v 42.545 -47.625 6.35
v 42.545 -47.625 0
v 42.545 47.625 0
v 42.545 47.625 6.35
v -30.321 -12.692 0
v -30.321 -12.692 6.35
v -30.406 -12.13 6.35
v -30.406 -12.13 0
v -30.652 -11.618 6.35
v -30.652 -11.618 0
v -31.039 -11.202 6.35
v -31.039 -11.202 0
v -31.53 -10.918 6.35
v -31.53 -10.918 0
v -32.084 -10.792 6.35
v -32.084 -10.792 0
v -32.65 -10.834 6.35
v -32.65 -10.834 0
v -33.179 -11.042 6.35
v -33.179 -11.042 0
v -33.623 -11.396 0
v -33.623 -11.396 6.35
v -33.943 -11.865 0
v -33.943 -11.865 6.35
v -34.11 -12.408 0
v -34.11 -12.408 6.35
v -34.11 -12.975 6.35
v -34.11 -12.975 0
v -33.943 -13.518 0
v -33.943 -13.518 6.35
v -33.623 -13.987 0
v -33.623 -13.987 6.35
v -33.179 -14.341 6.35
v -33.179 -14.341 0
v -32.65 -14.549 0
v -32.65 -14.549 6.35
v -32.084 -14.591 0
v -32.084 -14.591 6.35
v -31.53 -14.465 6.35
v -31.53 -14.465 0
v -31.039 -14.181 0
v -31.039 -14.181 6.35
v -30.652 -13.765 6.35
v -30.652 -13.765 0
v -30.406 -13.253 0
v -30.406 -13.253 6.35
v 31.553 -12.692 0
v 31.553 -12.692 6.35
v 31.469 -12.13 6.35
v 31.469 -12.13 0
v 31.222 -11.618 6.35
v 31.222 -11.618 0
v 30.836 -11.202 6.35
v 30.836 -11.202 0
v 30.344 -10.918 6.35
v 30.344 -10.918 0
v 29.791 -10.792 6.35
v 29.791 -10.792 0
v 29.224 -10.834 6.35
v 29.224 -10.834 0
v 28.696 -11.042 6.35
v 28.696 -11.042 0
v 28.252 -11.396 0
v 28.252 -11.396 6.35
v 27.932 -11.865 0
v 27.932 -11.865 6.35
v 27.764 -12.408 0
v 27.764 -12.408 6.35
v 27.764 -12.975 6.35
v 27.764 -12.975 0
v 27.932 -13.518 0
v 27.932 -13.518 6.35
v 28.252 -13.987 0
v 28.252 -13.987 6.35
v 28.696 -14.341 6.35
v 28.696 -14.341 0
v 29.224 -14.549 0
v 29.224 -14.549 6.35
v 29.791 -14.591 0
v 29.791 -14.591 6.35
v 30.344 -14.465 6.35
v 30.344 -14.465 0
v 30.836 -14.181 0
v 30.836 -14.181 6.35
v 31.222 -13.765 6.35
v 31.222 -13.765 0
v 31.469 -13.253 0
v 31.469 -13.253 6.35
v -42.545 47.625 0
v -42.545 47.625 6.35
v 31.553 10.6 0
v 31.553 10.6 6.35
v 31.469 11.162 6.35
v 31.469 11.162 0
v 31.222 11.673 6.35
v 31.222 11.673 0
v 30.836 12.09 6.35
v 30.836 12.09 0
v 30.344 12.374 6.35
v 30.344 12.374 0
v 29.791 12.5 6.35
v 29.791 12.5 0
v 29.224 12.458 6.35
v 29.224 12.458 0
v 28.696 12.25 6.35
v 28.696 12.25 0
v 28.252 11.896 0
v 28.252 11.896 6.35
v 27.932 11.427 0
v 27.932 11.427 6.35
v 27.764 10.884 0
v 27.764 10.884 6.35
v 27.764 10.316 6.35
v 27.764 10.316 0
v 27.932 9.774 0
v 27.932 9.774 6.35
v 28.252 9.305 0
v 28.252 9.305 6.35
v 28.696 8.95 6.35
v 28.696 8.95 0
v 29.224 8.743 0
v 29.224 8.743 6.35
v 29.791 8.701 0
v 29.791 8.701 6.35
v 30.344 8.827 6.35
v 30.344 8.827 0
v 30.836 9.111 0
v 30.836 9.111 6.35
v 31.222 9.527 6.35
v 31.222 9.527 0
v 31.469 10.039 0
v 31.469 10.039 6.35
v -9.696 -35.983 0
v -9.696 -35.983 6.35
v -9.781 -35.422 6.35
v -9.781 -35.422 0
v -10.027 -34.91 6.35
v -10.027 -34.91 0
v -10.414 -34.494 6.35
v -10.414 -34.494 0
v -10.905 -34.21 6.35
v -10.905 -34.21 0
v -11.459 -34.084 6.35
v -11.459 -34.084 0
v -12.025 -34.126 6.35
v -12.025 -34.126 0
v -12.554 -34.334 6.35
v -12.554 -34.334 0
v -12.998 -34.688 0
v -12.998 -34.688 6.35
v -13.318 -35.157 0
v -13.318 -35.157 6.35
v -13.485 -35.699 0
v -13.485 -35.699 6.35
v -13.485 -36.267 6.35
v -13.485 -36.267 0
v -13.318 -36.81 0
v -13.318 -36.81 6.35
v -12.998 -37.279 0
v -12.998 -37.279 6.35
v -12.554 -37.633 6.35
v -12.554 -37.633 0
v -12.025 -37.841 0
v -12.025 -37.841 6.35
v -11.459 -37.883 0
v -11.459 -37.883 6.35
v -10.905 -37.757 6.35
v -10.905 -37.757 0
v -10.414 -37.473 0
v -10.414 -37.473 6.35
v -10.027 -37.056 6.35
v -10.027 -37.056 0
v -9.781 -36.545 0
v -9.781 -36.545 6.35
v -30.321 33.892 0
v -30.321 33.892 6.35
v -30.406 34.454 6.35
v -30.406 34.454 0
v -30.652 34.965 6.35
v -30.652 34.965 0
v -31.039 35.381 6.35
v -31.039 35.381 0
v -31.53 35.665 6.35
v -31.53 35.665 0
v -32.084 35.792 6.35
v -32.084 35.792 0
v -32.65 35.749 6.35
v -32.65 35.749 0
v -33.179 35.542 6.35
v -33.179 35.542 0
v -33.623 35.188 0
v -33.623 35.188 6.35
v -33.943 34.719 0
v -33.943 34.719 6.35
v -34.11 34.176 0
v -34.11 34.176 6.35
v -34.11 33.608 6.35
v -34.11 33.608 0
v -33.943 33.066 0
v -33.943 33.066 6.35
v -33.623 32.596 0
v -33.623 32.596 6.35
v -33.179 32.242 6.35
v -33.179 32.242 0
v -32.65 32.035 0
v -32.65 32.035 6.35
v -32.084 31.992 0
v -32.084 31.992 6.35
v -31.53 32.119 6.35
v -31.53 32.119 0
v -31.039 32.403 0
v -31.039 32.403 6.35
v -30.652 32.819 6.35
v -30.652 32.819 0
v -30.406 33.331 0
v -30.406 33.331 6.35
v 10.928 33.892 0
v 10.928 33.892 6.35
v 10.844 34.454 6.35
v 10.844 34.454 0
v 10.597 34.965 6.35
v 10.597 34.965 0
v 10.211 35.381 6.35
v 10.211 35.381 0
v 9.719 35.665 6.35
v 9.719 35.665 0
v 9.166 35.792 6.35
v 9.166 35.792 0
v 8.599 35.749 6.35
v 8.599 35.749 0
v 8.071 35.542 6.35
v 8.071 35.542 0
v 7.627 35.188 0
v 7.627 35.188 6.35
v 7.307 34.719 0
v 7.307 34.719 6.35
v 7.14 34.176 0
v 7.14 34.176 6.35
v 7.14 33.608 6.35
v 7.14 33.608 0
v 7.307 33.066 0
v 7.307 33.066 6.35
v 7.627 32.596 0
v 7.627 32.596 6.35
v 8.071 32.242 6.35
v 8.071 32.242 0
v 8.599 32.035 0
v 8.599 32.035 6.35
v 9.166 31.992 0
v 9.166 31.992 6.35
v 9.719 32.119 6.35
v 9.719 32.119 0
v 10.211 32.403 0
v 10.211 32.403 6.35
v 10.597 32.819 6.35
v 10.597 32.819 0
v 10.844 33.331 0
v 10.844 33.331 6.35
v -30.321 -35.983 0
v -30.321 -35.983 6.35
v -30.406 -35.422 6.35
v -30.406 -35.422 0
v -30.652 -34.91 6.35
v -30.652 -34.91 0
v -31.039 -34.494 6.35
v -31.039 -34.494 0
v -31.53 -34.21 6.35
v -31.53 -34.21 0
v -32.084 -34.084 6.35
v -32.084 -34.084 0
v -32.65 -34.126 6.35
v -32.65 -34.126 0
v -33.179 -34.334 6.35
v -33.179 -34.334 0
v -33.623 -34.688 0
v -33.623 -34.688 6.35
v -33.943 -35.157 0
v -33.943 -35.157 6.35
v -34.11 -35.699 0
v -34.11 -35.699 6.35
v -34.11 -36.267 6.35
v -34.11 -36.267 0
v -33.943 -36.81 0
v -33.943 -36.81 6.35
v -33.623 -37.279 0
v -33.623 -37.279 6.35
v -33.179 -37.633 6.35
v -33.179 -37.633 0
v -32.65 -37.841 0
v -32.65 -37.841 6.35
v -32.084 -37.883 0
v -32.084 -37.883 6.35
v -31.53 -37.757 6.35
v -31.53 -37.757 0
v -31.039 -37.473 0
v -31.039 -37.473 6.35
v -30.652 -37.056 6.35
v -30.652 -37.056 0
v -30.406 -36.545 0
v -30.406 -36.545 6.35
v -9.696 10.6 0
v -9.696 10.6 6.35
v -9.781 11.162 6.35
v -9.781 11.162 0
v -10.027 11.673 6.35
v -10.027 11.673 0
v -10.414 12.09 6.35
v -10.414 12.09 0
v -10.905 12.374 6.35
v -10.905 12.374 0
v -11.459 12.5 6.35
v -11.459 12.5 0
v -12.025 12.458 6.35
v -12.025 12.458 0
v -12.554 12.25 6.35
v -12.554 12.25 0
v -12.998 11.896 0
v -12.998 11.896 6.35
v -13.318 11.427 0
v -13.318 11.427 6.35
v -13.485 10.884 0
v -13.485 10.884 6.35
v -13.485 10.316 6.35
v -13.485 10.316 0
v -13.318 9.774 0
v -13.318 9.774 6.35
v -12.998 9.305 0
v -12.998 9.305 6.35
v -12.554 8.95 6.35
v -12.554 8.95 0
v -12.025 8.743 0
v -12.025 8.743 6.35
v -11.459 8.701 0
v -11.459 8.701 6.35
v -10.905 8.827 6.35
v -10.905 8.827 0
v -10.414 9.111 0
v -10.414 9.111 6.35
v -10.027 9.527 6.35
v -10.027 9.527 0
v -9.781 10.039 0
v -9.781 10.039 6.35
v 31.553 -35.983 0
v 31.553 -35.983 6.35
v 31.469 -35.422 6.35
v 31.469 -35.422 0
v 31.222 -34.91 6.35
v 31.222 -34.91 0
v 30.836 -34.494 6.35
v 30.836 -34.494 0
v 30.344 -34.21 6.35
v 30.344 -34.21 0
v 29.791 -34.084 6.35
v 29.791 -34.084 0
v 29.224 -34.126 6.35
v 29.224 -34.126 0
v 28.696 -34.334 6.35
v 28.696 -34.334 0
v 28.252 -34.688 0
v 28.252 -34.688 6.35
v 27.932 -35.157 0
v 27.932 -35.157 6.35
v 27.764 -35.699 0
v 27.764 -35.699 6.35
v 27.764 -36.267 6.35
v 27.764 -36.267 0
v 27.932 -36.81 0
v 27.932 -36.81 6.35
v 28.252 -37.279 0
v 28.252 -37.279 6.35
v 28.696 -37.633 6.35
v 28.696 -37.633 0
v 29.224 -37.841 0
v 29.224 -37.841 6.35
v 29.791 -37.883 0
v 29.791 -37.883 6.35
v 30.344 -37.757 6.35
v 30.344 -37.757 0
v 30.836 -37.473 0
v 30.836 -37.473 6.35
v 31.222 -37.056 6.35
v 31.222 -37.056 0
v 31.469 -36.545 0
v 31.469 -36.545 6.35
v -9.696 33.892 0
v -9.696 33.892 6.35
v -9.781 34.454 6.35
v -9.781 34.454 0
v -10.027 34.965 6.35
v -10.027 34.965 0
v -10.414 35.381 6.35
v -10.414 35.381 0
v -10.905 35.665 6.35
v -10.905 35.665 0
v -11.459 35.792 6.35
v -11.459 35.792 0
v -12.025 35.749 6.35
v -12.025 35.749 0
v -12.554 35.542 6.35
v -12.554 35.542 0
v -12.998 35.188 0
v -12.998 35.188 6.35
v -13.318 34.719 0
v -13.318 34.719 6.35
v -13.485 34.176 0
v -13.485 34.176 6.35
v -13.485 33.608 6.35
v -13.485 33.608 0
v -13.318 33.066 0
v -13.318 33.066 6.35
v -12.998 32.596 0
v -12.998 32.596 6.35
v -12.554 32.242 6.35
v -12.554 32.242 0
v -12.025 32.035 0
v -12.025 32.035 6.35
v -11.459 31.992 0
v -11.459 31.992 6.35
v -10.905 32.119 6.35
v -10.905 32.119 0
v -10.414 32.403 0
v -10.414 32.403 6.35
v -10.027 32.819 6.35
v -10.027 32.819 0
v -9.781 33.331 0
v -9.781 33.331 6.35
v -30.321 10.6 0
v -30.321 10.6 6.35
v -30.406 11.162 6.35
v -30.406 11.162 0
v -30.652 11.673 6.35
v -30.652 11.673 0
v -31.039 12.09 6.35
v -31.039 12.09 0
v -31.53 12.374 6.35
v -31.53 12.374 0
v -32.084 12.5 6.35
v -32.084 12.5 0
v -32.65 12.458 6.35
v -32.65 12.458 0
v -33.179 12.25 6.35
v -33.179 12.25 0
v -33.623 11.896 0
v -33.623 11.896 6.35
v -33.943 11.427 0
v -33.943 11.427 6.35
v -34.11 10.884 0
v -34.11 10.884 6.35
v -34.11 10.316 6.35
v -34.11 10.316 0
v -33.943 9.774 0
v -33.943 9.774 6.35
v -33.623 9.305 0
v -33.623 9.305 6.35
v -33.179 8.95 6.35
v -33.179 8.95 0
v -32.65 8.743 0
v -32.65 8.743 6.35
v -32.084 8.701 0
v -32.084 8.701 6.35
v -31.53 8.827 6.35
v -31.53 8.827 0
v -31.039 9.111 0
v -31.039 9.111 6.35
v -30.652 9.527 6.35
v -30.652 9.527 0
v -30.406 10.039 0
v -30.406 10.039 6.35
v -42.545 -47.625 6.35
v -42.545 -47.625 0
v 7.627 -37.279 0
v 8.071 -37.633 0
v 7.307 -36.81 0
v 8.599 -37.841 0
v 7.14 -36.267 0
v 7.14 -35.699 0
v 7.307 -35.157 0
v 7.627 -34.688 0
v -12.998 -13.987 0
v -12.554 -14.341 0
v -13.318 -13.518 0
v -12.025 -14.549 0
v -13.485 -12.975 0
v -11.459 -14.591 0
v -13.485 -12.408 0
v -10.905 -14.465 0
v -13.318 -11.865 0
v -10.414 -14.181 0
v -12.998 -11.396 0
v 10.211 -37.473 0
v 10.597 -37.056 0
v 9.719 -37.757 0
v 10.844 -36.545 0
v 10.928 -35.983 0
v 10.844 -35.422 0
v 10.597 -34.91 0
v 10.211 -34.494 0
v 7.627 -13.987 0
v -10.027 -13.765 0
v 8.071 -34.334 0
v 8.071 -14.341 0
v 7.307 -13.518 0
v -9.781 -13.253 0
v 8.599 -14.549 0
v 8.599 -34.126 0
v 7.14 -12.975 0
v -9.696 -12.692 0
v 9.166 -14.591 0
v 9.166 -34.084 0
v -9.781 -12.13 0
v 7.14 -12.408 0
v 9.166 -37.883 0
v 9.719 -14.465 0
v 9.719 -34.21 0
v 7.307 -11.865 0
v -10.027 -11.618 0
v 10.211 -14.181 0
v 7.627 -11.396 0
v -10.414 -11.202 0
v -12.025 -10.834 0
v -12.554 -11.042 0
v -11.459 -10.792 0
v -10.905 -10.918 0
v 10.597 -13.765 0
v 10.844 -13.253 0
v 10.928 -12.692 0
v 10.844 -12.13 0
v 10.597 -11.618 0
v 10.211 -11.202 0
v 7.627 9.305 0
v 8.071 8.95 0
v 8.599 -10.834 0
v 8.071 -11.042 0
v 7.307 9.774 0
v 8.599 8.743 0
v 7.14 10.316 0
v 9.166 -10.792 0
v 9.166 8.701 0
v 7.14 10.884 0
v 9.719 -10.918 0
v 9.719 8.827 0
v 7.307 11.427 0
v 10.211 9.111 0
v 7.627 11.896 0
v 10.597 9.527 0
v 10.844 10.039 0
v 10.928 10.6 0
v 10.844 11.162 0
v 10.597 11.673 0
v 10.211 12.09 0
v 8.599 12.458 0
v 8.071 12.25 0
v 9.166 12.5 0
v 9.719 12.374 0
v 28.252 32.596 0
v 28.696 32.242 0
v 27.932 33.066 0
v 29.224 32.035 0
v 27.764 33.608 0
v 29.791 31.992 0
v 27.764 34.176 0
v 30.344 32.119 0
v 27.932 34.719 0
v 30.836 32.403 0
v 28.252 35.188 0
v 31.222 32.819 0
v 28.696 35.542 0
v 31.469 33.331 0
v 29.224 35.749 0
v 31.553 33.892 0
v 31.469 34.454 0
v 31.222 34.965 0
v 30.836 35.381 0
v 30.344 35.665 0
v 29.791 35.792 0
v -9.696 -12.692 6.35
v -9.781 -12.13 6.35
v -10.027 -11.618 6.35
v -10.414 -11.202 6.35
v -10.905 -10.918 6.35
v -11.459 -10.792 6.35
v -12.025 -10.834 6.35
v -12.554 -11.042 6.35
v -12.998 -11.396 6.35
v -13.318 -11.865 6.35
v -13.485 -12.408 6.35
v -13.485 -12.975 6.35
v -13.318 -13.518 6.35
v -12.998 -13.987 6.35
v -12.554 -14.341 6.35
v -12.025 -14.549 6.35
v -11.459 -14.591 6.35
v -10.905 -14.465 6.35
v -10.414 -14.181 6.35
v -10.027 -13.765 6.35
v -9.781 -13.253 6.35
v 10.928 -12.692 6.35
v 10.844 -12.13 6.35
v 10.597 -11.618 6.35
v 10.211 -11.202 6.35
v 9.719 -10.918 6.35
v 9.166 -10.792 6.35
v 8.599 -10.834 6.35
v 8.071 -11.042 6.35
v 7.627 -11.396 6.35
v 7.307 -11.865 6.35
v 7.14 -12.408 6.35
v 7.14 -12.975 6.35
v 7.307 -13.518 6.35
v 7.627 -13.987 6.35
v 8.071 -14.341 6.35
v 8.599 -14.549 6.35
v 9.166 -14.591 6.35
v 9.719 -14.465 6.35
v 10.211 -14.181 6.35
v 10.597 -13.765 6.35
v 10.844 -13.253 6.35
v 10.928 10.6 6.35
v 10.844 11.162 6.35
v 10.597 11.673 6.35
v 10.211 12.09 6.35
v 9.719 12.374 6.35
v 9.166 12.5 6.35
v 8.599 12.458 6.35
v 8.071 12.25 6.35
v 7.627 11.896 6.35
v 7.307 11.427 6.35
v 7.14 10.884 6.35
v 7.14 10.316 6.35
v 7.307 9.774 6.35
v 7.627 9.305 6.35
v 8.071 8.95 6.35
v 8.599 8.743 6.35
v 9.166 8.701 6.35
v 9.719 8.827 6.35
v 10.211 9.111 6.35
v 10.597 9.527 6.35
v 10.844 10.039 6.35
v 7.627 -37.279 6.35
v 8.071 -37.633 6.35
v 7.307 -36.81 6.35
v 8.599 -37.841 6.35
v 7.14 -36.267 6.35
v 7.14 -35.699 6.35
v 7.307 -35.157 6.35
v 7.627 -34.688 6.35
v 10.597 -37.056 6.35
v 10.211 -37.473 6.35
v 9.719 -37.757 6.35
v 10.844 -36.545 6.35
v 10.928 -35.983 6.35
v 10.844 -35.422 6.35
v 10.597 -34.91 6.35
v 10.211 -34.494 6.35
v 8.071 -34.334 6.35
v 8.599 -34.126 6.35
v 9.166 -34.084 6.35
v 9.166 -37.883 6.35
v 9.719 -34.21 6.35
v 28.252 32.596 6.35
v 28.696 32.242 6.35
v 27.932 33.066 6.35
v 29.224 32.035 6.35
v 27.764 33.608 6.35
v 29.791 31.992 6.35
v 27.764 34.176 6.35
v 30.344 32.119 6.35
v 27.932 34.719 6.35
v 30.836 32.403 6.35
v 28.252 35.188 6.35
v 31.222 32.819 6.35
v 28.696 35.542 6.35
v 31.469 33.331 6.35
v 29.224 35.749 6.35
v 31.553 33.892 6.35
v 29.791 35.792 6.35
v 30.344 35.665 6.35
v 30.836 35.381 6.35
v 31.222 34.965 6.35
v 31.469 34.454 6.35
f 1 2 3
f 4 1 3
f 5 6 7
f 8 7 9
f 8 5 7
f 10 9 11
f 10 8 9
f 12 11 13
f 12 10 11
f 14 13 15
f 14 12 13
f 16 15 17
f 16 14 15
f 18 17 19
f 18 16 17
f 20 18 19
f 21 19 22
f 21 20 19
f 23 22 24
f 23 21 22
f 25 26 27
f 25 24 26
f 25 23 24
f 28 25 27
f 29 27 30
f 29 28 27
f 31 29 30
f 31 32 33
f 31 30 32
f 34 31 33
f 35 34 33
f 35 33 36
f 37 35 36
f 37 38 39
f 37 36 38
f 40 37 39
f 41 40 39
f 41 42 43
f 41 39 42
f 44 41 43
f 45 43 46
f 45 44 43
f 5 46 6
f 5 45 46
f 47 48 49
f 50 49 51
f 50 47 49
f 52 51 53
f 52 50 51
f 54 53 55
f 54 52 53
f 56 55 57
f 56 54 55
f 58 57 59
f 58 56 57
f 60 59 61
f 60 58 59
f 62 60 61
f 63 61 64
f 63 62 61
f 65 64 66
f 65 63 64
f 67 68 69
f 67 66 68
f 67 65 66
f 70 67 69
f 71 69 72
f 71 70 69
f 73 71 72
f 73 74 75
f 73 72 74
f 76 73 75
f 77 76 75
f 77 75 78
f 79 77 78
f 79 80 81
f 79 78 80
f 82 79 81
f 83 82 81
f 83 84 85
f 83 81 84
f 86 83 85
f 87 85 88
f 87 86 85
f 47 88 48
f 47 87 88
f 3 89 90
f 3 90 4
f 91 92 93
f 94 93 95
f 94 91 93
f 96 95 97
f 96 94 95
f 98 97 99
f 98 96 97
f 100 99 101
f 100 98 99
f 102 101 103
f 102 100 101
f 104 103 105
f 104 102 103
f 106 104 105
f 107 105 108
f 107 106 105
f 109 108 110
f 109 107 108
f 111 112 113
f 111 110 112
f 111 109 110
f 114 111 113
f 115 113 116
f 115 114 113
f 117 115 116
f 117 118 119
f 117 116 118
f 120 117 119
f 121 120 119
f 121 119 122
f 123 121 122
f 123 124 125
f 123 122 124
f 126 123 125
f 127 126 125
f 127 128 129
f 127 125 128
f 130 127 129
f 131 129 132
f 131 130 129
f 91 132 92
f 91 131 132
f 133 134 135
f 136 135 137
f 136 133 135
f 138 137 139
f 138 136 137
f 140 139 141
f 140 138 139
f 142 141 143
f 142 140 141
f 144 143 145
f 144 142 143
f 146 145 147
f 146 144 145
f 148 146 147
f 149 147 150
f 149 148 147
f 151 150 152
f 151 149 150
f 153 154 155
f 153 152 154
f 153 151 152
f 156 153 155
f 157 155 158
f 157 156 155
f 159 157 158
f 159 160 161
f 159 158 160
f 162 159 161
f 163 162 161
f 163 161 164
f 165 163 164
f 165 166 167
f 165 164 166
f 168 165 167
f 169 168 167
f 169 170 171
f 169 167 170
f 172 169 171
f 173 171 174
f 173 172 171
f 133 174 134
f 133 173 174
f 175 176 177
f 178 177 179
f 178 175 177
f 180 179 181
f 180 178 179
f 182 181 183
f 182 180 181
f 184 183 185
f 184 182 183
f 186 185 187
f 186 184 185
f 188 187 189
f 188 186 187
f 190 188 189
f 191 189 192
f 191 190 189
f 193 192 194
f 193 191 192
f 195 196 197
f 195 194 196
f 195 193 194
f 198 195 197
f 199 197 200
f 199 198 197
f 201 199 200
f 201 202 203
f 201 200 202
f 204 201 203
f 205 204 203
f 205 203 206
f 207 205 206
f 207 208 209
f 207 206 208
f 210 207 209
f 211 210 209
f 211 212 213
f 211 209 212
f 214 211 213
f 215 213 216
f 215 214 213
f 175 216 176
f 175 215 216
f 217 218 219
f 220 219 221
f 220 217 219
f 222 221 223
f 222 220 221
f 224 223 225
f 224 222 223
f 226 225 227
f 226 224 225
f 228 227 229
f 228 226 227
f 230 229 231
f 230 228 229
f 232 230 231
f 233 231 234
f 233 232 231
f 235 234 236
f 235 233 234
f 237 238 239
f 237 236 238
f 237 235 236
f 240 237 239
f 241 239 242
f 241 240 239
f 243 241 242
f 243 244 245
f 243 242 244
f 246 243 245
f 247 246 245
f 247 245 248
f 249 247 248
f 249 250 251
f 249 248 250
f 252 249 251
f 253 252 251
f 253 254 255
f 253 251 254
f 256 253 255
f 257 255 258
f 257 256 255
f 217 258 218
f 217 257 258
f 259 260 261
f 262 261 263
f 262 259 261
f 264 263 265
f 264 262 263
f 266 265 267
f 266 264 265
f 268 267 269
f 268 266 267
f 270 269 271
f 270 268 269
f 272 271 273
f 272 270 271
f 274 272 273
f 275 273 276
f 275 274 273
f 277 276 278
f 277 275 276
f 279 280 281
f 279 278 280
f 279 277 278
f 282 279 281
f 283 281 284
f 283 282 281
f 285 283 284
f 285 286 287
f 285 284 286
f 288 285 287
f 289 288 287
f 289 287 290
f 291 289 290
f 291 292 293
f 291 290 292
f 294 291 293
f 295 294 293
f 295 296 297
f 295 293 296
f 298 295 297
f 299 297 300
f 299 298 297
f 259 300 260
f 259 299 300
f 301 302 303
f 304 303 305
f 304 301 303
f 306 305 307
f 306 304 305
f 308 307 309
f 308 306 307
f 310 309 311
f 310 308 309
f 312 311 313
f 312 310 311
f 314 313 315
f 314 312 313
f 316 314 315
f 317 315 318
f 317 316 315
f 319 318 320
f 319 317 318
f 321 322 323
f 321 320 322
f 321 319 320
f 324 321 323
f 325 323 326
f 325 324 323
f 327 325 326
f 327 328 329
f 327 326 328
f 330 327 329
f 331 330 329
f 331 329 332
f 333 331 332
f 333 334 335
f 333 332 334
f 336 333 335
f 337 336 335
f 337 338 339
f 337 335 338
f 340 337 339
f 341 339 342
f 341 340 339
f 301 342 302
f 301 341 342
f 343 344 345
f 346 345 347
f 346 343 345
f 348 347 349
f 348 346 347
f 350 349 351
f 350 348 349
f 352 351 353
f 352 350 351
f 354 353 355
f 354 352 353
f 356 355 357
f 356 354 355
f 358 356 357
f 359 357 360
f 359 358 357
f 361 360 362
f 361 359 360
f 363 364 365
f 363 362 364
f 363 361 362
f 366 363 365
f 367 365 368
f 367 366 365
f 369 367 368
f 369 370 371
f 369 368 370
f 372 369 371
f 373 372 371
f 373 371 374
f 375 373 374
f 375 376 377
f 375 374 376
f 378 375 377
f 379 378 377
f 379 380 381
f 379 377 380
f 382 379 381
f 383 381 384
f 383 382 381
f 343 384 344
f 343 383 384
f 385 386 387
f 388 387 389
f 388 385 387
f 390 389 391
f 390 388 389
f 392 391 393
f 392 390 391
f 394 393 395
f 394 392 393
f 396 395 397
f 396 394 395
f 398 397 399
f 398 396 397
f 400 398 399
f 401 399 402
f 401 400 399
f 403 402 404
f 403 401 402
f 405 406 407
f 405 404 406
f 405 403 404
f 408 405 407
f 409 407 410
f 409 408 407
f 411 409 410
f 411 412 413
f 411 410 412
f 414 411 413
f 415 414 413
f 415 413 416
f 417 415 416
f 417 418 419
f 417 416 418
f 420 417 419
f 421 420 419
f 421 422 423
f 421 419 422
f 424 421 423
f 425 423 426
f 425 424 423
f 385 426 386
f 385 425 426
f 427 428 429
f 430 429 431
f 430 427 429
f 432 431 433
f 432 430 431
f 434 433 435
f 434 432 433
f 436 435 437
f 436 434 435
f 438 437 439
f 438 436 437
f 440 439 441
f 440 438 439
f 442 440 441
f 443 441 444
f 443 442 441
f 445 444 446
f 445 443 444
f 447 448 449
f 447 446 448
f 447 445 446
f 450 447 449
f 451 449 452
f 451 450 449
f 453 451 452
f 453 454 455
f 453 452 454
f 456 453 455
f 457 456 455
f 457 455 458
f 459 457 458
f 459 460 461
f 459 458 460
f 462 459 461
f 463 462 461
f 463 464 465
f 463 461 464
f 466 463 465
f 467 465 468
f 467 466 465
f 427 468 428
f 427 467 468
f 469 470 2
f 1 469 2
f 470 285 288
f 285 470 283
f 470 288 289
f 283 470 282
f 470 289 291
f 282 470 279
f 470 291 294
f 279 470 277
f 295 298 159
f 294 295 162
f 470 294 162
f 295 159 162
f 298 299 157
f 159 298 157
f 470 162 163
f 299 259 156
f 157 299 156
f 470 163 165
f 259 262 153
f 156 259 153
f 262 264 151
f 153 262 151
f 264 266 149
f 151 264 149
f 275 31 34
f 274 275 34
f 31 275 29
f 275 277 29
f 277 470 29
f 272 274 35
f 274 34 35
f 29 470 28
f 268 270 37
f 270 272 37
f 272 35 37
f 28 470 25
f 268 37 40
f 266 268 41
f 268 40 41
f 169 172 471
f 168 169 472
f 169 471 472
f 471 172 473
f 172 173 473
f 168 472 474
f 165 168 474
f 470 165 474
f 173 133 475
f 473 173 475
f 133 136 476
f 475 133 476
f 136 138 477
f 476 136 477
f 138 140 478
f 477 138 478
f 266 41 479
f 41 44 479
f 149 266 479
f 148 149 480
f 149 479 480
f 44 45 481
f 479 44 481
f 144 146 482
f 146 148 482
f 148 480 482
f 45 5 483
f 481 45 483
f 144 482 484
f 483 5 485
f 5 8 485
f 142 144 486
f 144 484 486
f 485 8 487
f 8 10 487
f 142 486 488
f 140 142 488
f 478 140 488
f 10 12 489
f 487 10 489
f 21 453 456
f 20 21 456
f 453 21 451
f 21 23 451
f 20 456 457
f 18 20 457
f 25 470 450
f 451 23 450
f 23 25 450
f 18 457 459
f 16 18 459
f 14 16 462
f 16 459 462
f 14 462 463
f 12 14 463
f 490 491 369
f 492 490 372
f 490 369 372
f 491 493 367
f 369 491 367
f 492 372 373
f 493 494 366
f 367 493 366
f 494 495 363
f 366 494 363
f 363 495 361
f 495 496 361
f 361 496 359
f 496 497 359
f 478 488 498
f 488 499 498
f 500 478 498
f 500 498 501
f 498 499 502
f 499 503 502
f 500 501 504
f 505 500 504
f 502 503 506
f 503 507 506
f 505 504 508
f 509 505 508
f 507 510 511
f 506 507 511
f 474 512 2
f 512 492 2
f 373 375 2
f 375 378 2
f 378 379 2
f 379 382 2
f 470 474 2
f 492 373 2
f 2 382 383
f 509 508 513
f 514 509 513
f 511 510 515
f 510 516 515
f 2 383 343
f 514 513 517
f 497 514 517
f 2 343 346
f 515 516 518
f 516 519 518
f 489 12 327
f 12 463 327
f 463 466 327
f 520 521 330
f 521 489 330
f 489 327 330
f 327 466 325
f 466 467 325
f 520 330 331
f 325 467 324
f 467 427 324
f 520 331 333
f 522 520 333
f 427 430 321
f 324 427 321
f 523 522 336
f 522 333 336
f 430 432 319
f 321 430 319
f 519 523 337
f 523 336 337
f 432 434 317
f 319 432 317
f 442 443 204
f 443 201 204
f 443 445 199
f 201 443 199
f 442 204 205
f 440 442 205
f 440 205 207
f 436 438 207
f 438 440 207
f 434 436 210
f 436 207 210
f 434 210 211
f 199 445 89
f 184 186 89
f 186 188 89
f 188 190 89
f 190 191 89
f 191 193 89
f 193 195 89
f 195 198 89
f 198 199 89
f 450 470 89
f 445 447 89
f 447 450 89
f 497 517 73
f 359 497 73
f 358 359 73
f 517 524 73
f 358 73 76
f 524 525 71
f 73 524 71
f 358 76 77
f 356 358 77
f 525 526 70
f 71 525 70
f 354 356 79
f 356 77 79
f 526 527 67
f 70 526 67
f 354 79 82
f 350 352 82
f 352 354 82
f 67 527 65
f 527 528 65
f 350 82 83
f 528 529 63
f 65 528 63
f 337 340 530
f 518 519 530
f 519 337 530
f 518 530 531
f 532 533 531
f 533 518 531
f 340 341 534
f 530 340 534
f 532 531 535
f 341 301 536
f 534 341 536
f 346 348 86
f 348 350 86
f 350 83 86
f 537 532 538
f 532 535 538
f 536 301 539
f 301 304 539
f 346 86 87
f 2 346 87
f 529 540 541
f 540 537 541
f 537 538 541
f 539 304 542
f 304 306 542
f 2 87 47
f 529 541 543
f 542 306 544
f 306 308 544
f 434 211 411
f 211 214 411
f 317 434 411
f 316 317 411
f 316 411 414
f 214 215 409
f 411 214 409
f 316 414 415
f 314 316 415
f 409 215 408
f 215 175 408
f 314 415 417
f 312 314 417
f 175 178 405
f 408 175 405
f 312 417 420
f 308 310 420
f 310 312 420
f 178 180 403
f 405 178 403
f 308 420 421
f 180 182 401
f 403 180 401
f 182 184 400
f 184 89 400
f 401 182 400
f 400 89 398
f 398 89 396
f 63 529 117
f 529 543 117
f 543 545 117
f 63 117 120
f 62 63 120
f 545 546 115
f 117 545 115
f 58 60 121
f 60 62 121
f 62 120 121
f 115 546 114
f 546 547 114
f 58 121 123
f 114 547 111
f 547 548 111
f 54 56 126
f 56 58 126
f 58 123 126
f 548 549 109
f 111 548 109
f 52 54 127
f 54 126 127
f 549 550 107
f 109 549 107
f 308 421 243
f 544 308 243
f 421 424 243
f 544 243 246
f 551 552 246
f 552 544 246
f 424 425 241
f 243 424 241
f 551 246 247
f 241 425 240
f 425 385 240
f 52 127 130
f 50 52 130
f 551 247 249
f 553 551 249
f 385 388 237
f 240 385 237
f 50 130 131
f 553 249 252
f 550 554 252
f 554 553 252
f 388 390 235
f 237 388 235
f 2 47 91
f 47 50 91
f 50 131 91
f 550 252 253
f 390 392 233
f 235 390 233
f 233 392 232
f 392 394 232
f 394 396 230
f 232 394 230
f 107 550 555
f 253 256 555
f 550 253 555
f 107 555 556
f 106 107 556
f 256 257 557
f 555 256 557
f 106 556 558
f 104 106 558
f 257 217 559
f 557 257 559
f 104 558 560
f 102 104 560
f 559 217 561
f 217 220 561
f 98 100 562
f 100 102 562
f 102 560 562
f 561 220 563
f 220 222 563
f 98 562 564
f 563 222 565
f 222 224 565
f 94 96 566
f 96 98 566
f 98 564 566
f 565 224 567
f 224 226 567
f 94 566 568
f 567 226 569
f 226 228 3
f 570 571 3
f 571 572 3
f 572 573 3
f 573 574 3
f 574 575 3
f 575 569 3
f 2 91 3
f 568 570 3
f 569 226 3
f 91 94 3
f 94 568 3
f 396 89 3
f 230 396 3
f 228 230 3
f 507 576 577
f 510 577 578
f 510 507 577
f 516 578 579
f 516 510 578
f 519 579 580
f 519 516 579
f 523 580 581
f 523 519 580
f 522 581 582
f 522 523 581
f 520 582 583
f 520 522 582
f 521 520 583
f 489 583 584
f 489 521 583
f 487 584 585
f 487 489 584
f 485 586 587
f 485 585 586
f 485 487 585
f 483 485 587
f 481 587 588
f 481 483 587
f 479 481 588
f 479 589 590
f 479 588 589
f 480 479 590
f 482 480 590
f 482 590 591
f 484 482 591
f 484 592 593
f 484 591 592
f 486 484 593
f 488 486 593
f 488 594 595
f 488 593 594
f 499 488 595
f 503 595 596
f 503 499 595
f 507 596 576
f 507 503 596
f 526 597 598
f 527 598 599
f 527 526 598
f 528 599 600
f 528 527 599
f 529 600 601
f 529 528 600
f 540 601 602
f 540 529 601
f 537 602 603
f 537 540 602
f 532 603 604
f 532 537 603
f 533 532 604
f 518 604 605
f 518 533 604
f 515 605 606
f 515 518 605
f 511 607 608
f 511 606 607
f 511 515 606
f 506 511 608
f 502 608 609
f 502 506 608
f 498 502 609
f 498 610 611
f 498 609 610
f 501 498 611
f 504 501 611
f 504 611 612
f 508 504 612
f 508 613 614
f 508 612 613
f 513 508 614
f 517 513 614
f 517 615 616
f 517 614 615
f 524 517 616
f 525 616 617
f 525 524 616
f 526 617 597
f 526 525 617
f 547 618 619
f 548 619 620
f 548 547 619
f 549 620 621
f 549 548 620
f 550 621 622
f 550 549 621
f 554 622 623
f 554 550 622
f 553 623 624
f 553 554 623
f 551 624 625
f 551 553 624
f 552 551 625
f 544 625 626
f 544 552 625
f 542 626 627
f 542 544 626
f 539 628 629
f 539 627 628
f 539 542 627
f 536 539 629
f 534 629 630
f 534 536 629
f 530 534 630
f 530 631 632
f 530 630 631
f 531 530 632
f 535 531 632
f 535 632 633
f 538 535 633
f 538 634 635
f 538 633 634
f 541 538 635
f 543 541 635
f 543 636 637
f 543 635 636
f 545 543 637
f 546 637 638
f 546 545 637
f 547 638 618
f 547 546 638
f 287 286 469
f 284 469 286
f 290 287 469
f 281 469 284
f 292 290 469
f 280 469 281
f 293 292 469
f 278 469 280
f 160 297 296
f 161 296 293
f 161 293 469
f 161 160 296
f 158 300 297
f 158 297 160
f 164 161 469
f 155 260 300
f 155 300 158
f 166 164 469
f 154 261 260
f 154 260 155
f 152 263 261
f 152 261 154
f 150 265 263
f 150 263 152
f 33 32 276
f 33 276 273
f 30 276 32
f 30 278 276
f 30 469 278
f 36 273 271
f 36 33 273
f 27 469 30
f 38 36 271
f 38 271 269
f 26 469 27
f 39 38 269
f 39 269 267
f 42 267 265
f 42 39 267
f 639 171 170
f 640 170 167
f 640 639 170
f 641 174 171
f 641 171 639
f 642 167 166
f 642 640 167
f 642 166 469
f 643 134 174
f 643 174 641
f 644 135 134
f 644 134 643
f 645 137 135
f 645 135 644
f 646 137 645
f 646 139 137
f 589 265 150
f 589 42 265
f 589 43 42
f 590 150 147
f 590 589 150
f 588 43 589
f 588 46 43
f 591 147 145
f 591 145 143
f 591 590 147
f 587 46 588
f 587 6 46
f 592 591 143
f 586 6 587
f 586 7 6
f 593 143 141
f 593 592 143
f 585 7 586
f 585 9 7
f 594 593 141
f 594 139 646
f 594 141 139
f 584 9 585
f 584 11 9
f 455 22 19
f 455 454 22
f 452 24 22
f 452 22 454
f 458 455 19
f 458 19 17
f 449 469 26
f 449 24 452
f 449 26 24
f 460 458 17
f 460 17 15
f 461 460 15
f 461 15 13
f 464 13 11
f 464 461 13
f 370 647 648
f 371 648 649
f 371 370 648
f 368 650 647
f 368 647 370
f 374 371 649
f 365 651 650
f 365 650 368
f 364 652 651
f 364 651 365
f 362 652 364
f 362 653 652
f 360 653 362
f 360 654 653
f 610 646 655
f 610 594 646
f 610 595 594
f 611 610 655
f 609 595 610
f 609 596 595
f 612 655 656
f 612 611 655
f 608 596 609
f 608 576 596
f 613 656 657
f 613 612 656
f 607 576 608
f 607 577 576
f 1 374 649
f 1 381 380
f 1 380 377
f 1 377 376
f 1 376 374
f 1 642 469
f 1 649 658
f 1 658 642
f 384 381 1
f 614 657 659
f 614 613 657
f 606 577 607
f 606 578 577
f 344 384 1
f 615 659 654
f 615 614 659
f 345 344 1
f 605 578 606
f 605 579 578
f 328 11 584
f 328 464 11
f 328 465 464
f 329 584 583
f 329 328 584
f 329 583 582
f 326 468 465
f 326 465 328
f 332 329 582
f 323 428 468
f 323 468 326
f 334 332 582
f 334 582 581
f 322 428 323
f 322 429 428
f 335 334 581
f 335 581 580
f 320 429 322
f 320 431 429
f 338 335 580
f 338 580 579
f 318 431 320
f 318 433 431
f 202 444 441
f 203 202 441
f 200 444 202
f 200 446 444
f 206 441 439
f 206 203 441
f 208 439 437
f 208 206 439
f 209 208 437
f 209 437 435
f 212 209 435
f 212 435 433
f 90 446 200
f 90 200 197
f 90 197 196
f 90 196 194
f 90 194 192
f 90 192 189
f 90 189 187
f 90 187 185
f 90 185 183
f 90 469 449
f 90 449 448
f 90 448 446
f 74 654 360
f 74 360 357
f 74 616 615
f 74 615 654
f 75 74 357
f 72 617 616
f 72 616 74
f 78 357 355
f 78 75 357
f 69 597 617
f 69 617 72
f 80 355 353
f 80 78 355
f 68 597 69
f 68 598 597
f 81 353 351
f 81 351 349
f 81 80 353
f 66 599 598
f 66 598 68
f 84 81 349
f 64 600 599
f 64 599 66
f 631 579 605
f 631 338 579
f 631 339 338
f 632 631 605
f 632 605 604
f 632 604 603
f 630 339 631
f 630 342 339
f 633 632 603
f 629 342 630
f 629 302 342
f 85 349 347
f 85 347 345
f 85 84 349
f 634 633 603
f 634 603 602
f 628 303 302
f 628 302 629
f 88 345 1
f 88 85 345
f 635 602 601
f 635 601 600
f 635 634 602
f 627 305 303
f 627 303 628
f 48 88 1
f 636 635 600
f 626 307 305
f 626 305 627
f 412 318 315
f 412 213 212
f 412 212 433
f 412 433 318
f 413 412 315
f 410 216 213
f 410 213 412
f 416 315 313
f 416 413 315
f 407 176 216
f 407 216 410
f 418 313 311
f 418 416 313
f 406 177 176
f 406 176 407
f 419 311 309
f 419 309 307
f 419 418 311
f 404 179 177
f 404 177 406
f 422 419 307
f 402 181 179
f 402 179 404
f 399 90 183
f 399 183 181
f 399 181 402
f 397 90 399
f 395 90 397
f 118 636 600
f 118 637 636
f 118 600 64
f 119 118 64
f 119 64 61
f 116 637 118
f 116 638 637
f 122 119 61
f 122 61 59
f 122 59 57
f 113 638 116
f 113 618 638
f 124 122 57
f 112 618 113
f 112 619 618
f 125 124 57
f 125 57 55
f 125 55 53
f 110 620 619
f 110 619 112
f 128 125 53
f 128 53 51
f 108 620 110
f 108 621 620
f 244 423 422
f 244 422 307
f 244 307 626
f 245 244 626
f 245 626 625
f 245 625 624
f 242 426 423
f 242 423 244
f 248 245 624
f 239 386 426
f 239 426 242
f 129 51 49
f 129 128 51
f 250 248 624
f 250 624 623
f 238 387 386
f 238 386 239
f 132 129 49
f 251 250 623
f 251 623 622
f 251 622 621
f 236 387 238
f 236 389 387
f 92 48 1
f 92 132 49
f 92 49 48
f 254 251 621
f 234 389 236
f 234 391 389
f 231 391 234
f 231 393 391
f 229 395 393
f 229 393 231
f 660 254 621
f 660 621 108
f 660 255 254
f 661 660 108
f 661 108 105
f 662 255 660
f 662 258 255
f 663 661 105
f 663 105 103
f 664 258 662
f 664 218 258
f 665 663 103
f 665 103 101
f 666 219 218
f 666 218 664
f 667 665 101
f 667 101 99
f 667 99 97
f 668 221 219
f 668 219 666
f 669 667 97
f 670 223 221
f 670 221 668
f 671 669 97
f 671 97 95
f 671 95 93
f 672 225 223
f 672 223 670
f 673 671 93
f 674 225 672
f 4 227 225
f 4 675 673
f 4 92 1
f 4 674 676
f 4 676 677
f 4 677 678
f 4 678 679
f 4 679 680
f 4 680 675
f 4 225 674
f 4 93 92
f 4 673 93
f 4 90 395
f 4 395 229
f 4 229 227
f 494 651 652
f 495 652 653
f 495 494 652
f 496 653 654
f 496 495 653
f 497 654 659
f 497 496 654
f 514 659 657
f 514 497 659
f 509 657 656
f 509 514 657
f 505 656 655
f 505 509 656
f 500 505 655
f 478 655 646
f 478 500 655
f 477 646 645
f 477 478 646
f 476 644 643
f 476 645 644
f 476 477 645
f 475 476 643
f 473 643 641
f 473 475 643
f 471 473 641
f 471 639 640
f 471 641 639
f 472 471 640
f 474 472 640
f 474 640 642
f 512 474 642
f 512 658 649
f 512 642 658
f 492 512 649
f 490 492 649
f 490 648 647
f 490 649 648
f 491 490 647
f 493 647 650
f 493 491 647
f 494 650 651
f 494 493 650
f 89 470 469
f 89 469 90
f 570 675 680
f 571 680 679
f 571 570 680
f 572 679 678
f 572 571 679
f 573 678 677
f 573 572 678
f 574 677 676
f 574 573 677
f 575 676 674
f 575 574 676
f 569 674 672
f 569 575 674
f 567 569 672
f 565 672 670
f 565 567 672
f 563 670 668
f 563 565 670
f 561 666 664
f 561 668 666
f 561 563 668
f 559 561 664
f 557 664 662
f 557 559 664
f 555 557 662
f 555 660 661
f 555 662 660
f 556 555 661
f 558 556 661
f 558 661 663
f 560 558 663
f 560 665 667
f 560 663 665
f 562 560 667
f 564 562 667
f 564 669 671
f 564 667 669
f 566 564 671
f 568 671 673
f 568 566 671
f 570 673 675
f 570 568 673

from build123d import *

# Parameters (mm, degrees)
F0_W     = 85.09
F0_H     = 95.25
F1_DEPTH = 6.35
F2_R     = 1.905
F3_DEPTH = 6.351


with BuildPart() as f1:
    # F0 (on Top) → F1 (new body)
    with BuildSketch(Plane.XY):
        Rectangle(F0_W, F0_H)
    extrude(amount=F1_DEPTH)

    # F2 (on Top) → F3 (cut, through all)
    with BuildSketch(Plane.XY):
        with Locations((-32.22625, -35.983333)):
            Circle(F2_R)
        with Locations((-32.22625, -12.691533)):
            Circle(F2_R)
        with Locations((-32.22625, 10.600267)):
            Circle(F2_R)
        with Locations((-32.22625, 33.892067)):
            Circle(F2_R)
        with Locations((-32.22625, 57.183867)):
            Circle(F2_R)
        with Locations((-32.22625, 80.475667)):
            Circle(F2_R)
        with Locations((-11.60145, -35.983333)):
            Circle(F2_R)
        with Locations((-11.60145, -12.691533)):
            Circle(F2_R)
        with Locations((-11.60145, 10.600267)):
            Circle(F2_R)
        with Locations((-11.60145, 33.892067)):
            Circle(F2_R)
        with Locations((-11.60145, 57.183867)):
            Circle(F2_R)
        with Locations((-11.60145, 80.475667)):
            Circle(F2_R)
        with Locations((9.02335, -35.983333)):
            Circle(F2_R)
        with Locations((9.02335, -12.691533)):
            Circle(F2_R)
        with Locations((9.02335, 10.600267)):
            Circle(F2_R)
        with Locations((9.02335, 33.892067)):
            Circle(F2_R)
        with Locations((9.02335, 57.183867)):
            Circle(F2_R)
        with Locations((9.02335, 80.475667)):
            Circle(F2_R)
        with Locations((29.64815, -35.983333)):
            Circle(F2_R)
        with Locations((29.64815, -12.691533)):
            Circle(F2_R)
        with Locations((29.64815, 10.600267)):
            Circle(F2_R)
        with Locations((29.64815, 33.892067)):
            Circle(F2_R)
        with Locations((29.64815, 57.183867)):
            Circle(F2_R)
        with Locations((29.64815, 80.475667)):
            Circle(F2_R)
    extrude(amount=F3_DEPTH, mode=Mode.SUBTRACT)


solid = f1.part
